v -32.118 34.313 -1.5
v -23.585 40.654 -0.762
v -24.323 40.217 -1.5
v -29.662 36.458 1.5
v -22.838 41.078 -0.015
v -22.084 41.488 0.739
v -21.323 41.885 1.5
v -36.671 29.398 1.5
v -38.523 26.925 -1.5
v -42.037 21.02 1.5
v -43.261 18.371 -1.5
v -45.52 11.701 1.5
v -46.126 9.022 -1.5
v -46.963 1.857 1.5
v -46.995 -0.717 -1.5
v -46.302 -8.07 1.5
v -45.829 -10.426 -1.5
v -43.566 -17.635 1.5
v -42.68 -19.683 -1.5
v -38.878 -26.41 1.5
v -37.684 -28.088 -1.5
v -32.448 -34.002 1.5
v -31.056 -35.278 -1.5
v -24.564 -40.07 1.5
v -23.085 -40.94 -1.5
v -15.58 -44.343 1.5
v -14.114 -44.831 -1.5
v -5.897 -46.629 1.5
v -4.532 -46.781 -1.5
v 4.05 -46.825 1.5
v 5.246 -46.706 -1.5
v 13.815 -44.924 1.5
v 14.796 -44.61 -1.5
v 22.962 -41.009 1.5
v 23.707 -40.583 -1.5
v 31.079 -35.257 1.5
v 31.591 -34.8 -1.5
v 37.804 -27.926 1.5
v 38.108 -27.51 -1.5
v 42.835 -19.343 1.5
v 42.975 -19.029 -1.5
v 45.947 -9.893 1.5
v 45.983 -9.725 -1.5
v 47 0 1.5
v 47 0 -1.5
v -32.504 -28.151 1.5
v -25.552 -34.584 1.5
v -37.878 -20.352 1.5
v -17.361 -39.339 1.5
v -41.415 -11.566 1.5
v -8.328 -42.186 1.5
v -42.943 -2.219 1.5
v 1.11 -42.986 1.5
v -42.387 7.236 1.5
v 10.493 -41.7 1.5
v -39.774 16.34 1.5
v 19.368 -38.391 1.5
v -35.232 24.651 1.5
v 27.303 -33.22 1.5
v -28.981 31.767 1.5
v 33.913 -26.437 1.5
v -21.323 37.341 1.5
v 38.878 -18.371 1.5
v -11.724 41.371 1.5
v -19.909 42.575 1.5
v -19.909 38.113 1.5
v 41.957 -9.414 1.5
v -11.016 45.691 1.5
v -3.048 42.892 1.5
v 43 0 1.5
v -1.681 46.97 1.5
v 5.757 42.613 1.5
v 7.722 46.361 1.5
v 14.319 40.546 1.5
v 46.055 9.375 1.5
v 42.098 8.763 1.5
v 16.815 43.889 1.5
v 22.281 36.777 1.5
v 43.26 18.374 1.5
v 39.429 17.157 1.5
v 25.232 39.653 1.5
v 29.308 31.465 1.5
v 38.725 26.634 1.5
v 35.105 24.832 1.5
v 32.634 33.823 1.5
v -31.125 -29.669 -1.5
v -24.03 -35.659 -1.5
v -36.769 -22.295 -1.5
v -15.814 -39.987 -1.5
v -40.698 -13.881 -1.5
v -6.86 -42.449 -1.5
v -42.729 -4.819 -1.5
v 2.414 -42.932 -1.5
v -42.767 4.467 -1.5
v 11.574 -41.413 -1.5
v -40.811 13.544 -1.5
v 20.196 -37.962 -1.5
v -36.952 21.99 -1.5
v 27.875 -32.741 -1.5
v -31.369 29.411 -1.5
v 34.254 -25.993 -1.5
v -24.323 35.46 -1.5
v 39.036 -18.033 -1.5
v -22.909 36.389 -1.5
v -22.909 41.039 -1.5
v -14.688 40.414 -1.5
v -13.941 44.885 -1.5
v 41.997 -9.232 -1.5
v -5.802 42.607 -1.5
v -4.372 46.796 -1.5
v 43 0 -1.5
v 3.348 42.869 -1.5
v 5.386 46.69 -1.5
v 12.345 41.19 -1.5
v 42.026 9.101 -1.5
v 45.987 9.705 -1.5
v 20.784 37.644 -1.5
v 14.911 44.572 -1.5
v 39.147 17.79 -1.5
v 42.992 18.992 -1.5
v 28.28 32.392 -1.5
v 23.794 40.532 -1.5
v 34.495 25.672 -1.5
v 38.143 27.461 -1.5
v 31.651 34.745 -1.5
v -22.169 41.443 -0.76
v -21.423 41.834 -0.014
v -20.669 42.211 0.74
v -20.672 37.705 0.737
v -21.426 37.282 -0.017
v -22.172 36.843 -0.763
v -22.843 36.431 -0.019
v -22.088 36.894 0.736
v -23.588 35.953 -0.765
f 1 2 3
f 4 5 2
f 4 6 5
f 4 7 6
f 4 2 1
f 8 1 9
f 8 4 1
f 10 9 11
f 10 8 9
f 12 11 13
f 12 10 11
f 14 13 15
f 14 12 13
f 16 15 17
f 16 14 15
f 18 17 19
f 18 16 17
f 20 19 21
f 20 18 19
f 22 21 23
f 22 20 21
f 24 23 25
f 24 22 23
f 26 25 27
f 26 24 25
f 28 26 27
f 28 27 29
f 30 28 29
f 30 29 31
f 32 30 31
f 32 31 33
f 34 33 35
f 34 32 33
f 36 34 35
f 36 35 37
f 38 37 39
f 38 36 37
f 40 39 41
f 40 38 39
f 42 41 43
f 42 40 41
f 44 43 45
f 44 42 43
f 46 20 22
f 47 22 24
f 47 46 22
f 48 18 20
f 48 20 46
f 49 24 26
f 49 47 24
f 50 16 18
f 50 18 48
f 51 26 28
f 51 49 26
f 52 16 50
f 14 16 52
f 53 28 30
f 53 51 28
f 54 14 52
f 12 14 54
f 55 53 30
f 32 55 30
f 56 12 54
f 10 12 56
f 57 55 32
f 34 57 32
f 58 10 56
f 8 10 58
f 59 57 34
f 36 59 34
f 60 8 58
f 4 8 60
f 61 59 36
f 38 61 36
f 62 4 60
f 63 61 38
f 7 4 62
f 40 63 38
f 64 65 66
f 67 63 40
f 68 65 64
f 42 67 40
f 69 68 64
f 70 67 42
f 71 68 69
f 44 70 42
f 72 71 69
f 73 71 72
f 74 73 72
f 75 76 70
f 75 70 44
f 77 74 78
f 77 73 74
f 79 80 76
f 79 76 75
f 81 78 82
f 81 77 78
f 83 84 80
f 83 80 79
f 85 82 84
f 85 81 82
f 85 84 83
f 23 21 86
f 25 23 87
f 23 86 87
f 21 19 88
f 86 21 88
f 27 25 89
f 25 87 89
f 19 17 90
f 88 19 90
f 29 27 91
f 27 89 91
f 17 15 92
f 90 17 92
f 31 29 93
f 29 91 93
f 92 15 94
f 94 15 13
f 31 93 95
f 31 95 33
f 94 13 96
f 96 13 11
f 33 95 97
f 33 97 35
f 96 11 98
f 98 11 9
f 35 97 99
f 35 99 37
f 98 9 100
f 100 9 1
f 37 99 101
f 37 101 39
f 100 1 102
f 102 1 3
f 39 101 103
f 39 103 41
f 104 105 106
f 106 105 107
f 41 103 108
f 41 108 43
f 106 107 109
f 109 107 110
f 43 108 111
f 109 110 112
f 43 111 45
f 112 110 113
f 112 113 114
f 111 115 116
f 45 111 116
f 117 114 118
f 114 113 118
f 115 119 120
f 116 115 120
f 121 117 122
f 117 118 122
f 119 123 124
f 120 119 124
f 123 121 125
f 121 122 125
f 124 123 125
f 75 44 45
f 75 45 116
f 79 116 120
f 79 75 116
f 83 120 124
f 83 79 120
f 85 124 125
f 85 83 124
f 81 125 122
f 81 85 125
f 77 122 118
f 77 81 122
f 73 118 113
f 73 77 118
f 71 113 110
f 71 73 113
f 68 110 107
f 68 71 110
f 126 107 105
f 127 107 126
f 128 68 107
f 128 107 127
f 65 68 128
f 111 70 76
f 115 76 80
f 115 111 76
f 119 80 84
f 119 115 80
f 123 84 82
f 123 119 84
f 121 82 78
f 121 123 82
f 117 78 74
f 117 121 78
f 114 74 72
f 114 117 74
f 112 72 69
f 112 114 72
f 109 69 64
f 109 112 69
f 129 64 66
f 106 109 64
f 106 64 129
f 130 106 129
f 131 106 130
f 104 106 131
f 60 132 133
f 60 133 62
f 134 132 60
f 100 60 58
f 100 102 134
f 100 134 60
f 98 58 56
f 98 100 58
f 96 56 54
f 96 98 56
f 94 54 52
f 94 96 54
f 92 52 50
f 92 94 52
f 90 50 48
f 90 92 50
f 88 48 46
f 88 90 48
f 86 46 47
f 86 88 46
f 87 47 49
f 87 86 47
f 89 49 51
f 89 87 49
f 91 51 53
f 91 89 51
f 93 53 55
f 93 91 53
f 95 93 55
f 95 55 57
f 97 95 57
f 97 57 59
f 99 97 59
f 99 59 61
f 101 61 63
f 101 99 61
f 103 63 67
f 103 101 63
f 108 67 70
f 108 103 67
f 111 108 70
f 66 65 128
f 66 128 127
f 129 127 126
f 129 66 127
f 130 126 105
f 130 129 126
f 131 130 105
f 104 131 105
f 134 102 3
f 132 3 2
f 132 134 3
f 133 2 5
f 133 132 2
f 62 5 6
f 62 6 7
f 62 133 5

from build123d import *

# Parameters (mm, degrees)
SKETCH1_R           = 47
SKETCH1_R_2         = 43
BOSS_EXTRUDE1_DEPTH = 1.5
CUT_EXTRUDE1_DEPTH  = 100


with BuildPart() as part:
    # Sketch1 → Boss-Extrude1 (new, symmetric)
    with BuildSketch(Plane(origin=(0, 0, 0), x_dir=(0, 1, 0), z_dir=(0, 0, 1))):
        with Locations(Location((0, 0, 0), (0, 0, 270))):
            Circle(SKETCH1_R)
        with Locations(Location((0, 0, 0), (0, 0, 270))):
            Circle(SKETCH1_R_2, mode=Mode.SUBTRACT)
    extrude(amount=BOSS_EXTRUDE1_DEPTH, both=True)

    # Sketch4 → Cut-Extrude1 (cut)
    with BuildSketch(Plane(origin=(0, 0, 0), x_dir=(-1, 0, 0), z_dir=(0, 1, 0))):
        Polygon((19.908984976, 1.5), (22.908984976, -1.5), (24.323198539, -1.5), (21.323198539, 1.5), align=None)
    extrude(amount=CUT_EXTRUDE1_DEPTH, mode=Mode.SUBTRACT)


solid = part.part
